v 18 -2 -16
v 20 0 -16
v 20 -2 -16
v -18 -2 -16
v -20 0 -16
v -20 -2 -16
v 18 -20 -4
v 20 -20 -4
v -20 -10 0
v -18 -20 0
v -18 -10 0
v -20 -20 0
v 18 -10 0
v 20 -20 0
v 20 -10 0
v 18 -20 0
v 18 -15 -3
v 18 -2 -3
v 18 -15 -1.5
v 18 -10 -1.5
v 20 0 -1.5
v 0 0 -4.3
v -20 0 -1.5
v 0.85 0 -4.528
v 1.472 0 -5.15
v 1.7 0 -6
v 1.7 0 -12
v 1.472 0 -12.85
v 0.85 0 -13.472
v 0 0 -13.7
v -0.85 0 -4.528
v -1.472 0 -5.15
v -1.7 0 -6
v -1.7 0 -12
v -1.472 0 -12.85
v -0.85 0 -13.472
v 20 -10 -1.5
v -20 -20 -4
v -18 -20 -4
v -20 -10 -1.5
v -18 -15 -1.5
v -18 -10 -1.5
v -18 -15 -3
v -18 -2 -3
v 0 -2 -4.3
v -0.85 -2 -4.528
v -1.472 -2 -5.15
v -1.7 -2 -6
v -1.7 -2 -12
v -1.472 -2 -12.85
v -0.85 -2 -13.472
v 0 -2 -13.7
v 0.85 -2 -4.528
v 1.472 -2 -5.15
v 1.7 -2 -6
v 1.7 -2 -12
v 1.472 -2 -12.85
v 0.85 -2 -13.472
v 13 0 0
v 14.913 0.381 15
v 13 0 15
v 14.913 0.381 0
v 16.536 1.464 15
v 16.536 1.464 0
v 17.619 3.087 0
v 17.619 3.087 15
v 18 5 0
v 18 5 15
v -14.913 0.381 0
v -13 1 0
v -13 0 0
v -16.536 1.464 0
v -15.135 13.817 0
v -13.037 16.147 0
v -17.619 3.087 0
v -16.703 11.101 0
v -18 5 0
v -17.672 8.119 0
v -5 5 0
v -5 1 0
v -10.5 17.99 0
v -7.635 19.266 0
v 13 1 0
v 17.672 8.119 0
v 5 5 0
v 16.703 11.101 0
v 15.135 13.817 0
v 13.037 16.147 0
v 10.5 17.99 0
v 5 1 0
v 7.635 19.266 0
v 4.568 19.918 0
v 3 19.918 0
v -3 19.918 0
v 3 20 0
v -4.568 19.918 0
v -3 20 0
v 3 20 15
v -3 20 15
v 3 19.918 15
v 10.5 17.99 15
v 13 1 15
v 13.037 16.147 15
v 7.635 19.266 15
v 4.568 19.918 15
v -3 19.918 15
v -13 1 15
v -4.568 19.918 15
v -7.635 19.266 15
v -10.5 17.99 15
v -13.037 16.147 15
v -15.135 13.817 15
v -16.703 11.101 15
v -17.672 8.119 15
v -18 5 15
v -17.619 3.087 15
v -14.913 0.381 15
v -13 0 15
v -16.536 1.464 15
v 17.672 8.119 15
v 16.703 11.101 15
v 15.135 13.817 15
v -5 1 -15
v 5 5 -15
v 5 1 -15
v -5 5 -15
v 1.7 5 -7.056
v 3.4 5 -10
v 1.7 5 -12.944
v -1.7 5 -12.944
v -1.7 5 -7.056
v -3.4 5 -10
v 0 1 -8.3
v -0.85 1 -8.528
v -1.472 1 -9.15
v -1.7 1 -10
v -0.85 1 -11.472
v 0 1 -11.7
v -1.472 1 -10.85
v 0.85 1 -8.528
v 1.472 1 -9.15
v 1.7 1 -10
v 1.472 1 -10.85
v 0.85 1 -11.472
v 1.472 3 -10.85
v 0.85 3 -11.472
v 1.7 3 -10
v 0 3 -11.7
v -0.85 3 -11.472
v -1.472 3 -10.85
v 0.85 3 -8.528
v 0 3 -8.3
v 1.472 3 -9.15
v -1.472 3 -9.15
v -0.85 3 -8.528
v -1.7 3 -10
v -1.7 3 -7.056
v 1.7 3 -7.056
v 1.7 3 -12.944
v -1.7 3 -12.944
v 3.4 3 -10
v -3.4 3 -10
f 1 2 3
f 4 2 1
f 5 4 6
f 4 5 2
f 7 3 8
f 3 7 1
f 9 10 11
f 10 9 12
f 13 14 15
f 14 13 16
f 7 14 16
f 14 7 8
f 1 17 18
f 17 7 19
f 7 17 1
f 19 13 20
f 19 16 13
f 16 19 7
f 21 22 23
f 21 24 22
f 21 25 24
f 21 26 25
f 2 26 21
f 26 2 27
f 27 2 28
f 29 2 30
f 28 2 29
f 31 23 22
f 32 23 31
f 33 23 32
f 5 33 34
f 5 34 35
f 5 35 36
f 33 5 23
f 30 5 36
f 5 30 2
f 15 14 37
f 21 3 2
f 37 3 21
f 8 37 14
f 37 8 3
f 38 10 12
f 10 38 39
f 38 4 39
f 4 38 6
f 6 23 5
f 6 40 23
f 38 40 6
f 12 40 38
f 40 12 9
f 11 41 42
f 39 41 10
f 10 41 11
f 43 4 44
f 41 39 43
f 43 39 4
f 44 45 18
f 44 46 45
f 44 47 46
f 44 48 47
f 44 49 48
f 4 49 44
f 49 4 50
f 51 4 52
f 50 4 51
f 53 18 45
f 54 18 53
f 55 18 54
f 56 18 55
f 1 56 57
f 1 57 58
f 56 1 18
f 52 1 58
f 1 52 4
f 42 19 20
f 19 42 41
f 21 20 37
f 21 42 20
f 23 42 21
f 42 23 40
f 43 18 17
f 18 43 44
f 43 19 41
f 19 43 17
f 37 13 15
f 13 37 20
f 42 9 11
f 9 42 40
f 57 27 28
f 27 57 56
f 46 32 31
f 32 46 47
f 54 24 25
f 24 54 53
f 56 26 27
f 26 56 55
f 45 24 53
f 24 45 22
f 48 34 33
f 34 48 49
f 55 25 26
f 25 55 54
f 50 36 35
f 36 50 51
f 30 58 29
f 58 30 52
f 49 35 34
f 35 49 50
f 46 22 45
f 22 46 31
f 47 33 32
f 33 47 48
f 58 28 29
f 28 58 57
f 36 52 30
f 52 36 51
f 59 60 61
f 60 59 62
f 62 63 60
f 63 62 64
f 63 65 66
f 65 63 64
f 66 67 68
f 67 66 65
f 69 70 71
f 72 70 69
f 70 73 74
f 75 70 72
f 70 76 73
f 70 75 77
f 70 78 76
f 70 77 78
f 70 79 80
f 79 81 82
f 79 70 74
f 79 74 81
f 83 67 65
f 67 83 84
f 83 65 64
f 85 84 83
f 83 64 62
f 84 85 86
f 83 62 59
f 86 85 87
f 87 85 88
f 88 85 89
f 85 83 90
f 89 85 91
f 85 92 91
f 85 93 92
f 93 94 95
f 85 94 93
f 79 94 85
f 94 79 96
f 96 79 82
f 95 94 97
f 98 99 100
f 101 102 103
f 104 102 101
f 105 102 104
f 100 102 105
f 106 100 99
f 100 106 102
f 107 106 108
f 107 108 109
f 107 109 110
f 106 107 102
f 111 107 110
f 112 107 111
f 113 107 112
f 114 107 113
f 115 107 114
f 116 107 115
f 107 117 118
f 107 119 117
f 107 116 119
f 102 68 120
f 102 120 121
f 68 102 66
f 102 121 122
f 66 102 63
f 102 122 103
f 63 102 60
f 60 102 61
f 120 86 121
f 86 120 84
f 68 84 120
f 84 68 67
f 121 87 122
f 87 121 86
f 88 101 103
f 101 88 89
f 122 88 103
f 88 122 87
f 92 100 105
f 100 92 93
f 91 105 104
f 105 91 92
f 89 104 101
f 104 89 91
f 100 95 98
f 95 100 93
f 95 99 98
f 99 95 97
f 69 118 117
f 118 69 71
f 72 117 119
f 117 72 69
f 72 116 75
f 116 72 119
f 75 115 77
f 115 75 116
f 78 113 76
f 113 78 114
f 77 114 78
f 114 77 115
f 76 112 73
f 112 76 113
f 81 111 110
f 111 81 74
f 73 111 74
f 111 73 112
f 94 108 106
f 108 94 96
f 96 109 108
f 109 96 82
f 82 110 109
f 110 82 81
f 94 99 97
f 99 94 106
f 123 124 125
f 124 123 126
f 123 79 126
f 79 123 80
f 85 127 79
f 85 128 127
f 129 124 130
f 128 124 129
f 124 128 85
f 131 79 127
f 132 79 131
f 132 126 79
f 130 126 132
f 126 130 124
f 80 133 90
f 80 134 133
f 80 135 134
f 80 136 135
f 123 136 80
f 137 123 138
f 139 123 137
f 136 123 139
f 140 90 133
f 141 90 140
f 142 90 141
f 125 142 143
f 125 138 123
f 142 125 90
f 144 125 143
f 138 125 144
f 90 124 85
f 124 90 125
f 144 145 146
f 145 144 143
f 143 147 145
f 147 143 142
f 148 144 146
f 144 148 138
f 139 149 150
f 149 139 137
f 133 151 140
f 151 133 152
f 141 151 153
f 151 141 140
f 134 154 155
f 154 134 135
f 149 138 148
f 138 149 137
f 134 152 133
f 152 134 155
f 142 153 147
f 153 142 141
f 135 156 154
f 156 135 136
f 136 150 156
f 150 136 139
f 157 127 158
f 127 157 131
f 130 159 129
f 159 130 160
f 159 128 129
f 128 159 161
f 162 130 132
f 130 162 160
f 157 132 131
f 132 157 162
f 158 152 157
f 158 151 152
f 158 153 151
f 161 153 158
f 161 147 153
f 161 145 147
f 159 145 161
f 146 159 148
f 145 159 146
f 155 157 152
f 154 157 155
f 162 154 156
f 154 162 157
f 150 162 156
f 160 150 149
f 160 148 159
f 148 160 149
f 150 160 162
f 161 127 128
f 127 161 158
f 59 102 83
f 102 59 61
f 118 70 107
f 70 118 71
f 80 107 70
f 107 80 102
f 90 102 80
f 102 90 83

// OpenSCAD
H1 = 15;

module A() {
  translate([0, 5, 0]) union() {
    mirror([0,1,0]) cube([13, 5, H1]);
    translate([13, 0, 0]) intersection() {
      cylinder(h=H1, r=5);
      mirror([0,1,0]) cube([5, 5, H1]);
    };
    cube([3, 15, H1]);
    translate([3, 0, 0]) intersection() {
      cylinder(h=H1, r=15);
      cube([15, 15, H1]);
    };
  }
}

module B() {
  difference() {
    mirror([0, 0, 1]) translate([-5, 1, 0]) cube([10, 4, 15]);
    translate([0,0,-10]) rotate([-90, 0, 0]) cylinder(h=6, d=3.4, $fn=12);
    translate([0,3,-10]) rotate([-90, 0, 0]) cylinder(h=6, d=6.8, $fn=6);
  }
}

module C() {
  translate([20,0,0]) rotate([90,0,-90]) linear_extrude(height=2) polygon([[20,-4], [20,0], [0,0], [0,-16], [2,-16]]);
}

module FRONT() {
  difference() {
    union() {
      C();
      mirror([1,0,0]) C();
      translate([-20,-2,-16]) cube([40,2,16]);
      translate([-20,-15,-3]) cube([40,15,1.5]);
    };
    translate([-20,-10,-1.5]) cube([40,10,2]);
    hull() {
      translate([0,0,-6]) rotate([90, 0, 0]) cylinder(h=6, d=3.4, $fn=12);
      translate([0,0,-12]) rotate([90, 0, 0]) cylinder(h=6, d=3.4, $fn=12);
    }
  }
}

module BACK() {
  difference() {
    union() {
      A();
      mirror([1,0,0]) A();
      B();
    };
    translate([-13,-1,0]) cube([26, 2, H1+1]);
  }
}

union() {
  FRONT();
  BACK();
}
